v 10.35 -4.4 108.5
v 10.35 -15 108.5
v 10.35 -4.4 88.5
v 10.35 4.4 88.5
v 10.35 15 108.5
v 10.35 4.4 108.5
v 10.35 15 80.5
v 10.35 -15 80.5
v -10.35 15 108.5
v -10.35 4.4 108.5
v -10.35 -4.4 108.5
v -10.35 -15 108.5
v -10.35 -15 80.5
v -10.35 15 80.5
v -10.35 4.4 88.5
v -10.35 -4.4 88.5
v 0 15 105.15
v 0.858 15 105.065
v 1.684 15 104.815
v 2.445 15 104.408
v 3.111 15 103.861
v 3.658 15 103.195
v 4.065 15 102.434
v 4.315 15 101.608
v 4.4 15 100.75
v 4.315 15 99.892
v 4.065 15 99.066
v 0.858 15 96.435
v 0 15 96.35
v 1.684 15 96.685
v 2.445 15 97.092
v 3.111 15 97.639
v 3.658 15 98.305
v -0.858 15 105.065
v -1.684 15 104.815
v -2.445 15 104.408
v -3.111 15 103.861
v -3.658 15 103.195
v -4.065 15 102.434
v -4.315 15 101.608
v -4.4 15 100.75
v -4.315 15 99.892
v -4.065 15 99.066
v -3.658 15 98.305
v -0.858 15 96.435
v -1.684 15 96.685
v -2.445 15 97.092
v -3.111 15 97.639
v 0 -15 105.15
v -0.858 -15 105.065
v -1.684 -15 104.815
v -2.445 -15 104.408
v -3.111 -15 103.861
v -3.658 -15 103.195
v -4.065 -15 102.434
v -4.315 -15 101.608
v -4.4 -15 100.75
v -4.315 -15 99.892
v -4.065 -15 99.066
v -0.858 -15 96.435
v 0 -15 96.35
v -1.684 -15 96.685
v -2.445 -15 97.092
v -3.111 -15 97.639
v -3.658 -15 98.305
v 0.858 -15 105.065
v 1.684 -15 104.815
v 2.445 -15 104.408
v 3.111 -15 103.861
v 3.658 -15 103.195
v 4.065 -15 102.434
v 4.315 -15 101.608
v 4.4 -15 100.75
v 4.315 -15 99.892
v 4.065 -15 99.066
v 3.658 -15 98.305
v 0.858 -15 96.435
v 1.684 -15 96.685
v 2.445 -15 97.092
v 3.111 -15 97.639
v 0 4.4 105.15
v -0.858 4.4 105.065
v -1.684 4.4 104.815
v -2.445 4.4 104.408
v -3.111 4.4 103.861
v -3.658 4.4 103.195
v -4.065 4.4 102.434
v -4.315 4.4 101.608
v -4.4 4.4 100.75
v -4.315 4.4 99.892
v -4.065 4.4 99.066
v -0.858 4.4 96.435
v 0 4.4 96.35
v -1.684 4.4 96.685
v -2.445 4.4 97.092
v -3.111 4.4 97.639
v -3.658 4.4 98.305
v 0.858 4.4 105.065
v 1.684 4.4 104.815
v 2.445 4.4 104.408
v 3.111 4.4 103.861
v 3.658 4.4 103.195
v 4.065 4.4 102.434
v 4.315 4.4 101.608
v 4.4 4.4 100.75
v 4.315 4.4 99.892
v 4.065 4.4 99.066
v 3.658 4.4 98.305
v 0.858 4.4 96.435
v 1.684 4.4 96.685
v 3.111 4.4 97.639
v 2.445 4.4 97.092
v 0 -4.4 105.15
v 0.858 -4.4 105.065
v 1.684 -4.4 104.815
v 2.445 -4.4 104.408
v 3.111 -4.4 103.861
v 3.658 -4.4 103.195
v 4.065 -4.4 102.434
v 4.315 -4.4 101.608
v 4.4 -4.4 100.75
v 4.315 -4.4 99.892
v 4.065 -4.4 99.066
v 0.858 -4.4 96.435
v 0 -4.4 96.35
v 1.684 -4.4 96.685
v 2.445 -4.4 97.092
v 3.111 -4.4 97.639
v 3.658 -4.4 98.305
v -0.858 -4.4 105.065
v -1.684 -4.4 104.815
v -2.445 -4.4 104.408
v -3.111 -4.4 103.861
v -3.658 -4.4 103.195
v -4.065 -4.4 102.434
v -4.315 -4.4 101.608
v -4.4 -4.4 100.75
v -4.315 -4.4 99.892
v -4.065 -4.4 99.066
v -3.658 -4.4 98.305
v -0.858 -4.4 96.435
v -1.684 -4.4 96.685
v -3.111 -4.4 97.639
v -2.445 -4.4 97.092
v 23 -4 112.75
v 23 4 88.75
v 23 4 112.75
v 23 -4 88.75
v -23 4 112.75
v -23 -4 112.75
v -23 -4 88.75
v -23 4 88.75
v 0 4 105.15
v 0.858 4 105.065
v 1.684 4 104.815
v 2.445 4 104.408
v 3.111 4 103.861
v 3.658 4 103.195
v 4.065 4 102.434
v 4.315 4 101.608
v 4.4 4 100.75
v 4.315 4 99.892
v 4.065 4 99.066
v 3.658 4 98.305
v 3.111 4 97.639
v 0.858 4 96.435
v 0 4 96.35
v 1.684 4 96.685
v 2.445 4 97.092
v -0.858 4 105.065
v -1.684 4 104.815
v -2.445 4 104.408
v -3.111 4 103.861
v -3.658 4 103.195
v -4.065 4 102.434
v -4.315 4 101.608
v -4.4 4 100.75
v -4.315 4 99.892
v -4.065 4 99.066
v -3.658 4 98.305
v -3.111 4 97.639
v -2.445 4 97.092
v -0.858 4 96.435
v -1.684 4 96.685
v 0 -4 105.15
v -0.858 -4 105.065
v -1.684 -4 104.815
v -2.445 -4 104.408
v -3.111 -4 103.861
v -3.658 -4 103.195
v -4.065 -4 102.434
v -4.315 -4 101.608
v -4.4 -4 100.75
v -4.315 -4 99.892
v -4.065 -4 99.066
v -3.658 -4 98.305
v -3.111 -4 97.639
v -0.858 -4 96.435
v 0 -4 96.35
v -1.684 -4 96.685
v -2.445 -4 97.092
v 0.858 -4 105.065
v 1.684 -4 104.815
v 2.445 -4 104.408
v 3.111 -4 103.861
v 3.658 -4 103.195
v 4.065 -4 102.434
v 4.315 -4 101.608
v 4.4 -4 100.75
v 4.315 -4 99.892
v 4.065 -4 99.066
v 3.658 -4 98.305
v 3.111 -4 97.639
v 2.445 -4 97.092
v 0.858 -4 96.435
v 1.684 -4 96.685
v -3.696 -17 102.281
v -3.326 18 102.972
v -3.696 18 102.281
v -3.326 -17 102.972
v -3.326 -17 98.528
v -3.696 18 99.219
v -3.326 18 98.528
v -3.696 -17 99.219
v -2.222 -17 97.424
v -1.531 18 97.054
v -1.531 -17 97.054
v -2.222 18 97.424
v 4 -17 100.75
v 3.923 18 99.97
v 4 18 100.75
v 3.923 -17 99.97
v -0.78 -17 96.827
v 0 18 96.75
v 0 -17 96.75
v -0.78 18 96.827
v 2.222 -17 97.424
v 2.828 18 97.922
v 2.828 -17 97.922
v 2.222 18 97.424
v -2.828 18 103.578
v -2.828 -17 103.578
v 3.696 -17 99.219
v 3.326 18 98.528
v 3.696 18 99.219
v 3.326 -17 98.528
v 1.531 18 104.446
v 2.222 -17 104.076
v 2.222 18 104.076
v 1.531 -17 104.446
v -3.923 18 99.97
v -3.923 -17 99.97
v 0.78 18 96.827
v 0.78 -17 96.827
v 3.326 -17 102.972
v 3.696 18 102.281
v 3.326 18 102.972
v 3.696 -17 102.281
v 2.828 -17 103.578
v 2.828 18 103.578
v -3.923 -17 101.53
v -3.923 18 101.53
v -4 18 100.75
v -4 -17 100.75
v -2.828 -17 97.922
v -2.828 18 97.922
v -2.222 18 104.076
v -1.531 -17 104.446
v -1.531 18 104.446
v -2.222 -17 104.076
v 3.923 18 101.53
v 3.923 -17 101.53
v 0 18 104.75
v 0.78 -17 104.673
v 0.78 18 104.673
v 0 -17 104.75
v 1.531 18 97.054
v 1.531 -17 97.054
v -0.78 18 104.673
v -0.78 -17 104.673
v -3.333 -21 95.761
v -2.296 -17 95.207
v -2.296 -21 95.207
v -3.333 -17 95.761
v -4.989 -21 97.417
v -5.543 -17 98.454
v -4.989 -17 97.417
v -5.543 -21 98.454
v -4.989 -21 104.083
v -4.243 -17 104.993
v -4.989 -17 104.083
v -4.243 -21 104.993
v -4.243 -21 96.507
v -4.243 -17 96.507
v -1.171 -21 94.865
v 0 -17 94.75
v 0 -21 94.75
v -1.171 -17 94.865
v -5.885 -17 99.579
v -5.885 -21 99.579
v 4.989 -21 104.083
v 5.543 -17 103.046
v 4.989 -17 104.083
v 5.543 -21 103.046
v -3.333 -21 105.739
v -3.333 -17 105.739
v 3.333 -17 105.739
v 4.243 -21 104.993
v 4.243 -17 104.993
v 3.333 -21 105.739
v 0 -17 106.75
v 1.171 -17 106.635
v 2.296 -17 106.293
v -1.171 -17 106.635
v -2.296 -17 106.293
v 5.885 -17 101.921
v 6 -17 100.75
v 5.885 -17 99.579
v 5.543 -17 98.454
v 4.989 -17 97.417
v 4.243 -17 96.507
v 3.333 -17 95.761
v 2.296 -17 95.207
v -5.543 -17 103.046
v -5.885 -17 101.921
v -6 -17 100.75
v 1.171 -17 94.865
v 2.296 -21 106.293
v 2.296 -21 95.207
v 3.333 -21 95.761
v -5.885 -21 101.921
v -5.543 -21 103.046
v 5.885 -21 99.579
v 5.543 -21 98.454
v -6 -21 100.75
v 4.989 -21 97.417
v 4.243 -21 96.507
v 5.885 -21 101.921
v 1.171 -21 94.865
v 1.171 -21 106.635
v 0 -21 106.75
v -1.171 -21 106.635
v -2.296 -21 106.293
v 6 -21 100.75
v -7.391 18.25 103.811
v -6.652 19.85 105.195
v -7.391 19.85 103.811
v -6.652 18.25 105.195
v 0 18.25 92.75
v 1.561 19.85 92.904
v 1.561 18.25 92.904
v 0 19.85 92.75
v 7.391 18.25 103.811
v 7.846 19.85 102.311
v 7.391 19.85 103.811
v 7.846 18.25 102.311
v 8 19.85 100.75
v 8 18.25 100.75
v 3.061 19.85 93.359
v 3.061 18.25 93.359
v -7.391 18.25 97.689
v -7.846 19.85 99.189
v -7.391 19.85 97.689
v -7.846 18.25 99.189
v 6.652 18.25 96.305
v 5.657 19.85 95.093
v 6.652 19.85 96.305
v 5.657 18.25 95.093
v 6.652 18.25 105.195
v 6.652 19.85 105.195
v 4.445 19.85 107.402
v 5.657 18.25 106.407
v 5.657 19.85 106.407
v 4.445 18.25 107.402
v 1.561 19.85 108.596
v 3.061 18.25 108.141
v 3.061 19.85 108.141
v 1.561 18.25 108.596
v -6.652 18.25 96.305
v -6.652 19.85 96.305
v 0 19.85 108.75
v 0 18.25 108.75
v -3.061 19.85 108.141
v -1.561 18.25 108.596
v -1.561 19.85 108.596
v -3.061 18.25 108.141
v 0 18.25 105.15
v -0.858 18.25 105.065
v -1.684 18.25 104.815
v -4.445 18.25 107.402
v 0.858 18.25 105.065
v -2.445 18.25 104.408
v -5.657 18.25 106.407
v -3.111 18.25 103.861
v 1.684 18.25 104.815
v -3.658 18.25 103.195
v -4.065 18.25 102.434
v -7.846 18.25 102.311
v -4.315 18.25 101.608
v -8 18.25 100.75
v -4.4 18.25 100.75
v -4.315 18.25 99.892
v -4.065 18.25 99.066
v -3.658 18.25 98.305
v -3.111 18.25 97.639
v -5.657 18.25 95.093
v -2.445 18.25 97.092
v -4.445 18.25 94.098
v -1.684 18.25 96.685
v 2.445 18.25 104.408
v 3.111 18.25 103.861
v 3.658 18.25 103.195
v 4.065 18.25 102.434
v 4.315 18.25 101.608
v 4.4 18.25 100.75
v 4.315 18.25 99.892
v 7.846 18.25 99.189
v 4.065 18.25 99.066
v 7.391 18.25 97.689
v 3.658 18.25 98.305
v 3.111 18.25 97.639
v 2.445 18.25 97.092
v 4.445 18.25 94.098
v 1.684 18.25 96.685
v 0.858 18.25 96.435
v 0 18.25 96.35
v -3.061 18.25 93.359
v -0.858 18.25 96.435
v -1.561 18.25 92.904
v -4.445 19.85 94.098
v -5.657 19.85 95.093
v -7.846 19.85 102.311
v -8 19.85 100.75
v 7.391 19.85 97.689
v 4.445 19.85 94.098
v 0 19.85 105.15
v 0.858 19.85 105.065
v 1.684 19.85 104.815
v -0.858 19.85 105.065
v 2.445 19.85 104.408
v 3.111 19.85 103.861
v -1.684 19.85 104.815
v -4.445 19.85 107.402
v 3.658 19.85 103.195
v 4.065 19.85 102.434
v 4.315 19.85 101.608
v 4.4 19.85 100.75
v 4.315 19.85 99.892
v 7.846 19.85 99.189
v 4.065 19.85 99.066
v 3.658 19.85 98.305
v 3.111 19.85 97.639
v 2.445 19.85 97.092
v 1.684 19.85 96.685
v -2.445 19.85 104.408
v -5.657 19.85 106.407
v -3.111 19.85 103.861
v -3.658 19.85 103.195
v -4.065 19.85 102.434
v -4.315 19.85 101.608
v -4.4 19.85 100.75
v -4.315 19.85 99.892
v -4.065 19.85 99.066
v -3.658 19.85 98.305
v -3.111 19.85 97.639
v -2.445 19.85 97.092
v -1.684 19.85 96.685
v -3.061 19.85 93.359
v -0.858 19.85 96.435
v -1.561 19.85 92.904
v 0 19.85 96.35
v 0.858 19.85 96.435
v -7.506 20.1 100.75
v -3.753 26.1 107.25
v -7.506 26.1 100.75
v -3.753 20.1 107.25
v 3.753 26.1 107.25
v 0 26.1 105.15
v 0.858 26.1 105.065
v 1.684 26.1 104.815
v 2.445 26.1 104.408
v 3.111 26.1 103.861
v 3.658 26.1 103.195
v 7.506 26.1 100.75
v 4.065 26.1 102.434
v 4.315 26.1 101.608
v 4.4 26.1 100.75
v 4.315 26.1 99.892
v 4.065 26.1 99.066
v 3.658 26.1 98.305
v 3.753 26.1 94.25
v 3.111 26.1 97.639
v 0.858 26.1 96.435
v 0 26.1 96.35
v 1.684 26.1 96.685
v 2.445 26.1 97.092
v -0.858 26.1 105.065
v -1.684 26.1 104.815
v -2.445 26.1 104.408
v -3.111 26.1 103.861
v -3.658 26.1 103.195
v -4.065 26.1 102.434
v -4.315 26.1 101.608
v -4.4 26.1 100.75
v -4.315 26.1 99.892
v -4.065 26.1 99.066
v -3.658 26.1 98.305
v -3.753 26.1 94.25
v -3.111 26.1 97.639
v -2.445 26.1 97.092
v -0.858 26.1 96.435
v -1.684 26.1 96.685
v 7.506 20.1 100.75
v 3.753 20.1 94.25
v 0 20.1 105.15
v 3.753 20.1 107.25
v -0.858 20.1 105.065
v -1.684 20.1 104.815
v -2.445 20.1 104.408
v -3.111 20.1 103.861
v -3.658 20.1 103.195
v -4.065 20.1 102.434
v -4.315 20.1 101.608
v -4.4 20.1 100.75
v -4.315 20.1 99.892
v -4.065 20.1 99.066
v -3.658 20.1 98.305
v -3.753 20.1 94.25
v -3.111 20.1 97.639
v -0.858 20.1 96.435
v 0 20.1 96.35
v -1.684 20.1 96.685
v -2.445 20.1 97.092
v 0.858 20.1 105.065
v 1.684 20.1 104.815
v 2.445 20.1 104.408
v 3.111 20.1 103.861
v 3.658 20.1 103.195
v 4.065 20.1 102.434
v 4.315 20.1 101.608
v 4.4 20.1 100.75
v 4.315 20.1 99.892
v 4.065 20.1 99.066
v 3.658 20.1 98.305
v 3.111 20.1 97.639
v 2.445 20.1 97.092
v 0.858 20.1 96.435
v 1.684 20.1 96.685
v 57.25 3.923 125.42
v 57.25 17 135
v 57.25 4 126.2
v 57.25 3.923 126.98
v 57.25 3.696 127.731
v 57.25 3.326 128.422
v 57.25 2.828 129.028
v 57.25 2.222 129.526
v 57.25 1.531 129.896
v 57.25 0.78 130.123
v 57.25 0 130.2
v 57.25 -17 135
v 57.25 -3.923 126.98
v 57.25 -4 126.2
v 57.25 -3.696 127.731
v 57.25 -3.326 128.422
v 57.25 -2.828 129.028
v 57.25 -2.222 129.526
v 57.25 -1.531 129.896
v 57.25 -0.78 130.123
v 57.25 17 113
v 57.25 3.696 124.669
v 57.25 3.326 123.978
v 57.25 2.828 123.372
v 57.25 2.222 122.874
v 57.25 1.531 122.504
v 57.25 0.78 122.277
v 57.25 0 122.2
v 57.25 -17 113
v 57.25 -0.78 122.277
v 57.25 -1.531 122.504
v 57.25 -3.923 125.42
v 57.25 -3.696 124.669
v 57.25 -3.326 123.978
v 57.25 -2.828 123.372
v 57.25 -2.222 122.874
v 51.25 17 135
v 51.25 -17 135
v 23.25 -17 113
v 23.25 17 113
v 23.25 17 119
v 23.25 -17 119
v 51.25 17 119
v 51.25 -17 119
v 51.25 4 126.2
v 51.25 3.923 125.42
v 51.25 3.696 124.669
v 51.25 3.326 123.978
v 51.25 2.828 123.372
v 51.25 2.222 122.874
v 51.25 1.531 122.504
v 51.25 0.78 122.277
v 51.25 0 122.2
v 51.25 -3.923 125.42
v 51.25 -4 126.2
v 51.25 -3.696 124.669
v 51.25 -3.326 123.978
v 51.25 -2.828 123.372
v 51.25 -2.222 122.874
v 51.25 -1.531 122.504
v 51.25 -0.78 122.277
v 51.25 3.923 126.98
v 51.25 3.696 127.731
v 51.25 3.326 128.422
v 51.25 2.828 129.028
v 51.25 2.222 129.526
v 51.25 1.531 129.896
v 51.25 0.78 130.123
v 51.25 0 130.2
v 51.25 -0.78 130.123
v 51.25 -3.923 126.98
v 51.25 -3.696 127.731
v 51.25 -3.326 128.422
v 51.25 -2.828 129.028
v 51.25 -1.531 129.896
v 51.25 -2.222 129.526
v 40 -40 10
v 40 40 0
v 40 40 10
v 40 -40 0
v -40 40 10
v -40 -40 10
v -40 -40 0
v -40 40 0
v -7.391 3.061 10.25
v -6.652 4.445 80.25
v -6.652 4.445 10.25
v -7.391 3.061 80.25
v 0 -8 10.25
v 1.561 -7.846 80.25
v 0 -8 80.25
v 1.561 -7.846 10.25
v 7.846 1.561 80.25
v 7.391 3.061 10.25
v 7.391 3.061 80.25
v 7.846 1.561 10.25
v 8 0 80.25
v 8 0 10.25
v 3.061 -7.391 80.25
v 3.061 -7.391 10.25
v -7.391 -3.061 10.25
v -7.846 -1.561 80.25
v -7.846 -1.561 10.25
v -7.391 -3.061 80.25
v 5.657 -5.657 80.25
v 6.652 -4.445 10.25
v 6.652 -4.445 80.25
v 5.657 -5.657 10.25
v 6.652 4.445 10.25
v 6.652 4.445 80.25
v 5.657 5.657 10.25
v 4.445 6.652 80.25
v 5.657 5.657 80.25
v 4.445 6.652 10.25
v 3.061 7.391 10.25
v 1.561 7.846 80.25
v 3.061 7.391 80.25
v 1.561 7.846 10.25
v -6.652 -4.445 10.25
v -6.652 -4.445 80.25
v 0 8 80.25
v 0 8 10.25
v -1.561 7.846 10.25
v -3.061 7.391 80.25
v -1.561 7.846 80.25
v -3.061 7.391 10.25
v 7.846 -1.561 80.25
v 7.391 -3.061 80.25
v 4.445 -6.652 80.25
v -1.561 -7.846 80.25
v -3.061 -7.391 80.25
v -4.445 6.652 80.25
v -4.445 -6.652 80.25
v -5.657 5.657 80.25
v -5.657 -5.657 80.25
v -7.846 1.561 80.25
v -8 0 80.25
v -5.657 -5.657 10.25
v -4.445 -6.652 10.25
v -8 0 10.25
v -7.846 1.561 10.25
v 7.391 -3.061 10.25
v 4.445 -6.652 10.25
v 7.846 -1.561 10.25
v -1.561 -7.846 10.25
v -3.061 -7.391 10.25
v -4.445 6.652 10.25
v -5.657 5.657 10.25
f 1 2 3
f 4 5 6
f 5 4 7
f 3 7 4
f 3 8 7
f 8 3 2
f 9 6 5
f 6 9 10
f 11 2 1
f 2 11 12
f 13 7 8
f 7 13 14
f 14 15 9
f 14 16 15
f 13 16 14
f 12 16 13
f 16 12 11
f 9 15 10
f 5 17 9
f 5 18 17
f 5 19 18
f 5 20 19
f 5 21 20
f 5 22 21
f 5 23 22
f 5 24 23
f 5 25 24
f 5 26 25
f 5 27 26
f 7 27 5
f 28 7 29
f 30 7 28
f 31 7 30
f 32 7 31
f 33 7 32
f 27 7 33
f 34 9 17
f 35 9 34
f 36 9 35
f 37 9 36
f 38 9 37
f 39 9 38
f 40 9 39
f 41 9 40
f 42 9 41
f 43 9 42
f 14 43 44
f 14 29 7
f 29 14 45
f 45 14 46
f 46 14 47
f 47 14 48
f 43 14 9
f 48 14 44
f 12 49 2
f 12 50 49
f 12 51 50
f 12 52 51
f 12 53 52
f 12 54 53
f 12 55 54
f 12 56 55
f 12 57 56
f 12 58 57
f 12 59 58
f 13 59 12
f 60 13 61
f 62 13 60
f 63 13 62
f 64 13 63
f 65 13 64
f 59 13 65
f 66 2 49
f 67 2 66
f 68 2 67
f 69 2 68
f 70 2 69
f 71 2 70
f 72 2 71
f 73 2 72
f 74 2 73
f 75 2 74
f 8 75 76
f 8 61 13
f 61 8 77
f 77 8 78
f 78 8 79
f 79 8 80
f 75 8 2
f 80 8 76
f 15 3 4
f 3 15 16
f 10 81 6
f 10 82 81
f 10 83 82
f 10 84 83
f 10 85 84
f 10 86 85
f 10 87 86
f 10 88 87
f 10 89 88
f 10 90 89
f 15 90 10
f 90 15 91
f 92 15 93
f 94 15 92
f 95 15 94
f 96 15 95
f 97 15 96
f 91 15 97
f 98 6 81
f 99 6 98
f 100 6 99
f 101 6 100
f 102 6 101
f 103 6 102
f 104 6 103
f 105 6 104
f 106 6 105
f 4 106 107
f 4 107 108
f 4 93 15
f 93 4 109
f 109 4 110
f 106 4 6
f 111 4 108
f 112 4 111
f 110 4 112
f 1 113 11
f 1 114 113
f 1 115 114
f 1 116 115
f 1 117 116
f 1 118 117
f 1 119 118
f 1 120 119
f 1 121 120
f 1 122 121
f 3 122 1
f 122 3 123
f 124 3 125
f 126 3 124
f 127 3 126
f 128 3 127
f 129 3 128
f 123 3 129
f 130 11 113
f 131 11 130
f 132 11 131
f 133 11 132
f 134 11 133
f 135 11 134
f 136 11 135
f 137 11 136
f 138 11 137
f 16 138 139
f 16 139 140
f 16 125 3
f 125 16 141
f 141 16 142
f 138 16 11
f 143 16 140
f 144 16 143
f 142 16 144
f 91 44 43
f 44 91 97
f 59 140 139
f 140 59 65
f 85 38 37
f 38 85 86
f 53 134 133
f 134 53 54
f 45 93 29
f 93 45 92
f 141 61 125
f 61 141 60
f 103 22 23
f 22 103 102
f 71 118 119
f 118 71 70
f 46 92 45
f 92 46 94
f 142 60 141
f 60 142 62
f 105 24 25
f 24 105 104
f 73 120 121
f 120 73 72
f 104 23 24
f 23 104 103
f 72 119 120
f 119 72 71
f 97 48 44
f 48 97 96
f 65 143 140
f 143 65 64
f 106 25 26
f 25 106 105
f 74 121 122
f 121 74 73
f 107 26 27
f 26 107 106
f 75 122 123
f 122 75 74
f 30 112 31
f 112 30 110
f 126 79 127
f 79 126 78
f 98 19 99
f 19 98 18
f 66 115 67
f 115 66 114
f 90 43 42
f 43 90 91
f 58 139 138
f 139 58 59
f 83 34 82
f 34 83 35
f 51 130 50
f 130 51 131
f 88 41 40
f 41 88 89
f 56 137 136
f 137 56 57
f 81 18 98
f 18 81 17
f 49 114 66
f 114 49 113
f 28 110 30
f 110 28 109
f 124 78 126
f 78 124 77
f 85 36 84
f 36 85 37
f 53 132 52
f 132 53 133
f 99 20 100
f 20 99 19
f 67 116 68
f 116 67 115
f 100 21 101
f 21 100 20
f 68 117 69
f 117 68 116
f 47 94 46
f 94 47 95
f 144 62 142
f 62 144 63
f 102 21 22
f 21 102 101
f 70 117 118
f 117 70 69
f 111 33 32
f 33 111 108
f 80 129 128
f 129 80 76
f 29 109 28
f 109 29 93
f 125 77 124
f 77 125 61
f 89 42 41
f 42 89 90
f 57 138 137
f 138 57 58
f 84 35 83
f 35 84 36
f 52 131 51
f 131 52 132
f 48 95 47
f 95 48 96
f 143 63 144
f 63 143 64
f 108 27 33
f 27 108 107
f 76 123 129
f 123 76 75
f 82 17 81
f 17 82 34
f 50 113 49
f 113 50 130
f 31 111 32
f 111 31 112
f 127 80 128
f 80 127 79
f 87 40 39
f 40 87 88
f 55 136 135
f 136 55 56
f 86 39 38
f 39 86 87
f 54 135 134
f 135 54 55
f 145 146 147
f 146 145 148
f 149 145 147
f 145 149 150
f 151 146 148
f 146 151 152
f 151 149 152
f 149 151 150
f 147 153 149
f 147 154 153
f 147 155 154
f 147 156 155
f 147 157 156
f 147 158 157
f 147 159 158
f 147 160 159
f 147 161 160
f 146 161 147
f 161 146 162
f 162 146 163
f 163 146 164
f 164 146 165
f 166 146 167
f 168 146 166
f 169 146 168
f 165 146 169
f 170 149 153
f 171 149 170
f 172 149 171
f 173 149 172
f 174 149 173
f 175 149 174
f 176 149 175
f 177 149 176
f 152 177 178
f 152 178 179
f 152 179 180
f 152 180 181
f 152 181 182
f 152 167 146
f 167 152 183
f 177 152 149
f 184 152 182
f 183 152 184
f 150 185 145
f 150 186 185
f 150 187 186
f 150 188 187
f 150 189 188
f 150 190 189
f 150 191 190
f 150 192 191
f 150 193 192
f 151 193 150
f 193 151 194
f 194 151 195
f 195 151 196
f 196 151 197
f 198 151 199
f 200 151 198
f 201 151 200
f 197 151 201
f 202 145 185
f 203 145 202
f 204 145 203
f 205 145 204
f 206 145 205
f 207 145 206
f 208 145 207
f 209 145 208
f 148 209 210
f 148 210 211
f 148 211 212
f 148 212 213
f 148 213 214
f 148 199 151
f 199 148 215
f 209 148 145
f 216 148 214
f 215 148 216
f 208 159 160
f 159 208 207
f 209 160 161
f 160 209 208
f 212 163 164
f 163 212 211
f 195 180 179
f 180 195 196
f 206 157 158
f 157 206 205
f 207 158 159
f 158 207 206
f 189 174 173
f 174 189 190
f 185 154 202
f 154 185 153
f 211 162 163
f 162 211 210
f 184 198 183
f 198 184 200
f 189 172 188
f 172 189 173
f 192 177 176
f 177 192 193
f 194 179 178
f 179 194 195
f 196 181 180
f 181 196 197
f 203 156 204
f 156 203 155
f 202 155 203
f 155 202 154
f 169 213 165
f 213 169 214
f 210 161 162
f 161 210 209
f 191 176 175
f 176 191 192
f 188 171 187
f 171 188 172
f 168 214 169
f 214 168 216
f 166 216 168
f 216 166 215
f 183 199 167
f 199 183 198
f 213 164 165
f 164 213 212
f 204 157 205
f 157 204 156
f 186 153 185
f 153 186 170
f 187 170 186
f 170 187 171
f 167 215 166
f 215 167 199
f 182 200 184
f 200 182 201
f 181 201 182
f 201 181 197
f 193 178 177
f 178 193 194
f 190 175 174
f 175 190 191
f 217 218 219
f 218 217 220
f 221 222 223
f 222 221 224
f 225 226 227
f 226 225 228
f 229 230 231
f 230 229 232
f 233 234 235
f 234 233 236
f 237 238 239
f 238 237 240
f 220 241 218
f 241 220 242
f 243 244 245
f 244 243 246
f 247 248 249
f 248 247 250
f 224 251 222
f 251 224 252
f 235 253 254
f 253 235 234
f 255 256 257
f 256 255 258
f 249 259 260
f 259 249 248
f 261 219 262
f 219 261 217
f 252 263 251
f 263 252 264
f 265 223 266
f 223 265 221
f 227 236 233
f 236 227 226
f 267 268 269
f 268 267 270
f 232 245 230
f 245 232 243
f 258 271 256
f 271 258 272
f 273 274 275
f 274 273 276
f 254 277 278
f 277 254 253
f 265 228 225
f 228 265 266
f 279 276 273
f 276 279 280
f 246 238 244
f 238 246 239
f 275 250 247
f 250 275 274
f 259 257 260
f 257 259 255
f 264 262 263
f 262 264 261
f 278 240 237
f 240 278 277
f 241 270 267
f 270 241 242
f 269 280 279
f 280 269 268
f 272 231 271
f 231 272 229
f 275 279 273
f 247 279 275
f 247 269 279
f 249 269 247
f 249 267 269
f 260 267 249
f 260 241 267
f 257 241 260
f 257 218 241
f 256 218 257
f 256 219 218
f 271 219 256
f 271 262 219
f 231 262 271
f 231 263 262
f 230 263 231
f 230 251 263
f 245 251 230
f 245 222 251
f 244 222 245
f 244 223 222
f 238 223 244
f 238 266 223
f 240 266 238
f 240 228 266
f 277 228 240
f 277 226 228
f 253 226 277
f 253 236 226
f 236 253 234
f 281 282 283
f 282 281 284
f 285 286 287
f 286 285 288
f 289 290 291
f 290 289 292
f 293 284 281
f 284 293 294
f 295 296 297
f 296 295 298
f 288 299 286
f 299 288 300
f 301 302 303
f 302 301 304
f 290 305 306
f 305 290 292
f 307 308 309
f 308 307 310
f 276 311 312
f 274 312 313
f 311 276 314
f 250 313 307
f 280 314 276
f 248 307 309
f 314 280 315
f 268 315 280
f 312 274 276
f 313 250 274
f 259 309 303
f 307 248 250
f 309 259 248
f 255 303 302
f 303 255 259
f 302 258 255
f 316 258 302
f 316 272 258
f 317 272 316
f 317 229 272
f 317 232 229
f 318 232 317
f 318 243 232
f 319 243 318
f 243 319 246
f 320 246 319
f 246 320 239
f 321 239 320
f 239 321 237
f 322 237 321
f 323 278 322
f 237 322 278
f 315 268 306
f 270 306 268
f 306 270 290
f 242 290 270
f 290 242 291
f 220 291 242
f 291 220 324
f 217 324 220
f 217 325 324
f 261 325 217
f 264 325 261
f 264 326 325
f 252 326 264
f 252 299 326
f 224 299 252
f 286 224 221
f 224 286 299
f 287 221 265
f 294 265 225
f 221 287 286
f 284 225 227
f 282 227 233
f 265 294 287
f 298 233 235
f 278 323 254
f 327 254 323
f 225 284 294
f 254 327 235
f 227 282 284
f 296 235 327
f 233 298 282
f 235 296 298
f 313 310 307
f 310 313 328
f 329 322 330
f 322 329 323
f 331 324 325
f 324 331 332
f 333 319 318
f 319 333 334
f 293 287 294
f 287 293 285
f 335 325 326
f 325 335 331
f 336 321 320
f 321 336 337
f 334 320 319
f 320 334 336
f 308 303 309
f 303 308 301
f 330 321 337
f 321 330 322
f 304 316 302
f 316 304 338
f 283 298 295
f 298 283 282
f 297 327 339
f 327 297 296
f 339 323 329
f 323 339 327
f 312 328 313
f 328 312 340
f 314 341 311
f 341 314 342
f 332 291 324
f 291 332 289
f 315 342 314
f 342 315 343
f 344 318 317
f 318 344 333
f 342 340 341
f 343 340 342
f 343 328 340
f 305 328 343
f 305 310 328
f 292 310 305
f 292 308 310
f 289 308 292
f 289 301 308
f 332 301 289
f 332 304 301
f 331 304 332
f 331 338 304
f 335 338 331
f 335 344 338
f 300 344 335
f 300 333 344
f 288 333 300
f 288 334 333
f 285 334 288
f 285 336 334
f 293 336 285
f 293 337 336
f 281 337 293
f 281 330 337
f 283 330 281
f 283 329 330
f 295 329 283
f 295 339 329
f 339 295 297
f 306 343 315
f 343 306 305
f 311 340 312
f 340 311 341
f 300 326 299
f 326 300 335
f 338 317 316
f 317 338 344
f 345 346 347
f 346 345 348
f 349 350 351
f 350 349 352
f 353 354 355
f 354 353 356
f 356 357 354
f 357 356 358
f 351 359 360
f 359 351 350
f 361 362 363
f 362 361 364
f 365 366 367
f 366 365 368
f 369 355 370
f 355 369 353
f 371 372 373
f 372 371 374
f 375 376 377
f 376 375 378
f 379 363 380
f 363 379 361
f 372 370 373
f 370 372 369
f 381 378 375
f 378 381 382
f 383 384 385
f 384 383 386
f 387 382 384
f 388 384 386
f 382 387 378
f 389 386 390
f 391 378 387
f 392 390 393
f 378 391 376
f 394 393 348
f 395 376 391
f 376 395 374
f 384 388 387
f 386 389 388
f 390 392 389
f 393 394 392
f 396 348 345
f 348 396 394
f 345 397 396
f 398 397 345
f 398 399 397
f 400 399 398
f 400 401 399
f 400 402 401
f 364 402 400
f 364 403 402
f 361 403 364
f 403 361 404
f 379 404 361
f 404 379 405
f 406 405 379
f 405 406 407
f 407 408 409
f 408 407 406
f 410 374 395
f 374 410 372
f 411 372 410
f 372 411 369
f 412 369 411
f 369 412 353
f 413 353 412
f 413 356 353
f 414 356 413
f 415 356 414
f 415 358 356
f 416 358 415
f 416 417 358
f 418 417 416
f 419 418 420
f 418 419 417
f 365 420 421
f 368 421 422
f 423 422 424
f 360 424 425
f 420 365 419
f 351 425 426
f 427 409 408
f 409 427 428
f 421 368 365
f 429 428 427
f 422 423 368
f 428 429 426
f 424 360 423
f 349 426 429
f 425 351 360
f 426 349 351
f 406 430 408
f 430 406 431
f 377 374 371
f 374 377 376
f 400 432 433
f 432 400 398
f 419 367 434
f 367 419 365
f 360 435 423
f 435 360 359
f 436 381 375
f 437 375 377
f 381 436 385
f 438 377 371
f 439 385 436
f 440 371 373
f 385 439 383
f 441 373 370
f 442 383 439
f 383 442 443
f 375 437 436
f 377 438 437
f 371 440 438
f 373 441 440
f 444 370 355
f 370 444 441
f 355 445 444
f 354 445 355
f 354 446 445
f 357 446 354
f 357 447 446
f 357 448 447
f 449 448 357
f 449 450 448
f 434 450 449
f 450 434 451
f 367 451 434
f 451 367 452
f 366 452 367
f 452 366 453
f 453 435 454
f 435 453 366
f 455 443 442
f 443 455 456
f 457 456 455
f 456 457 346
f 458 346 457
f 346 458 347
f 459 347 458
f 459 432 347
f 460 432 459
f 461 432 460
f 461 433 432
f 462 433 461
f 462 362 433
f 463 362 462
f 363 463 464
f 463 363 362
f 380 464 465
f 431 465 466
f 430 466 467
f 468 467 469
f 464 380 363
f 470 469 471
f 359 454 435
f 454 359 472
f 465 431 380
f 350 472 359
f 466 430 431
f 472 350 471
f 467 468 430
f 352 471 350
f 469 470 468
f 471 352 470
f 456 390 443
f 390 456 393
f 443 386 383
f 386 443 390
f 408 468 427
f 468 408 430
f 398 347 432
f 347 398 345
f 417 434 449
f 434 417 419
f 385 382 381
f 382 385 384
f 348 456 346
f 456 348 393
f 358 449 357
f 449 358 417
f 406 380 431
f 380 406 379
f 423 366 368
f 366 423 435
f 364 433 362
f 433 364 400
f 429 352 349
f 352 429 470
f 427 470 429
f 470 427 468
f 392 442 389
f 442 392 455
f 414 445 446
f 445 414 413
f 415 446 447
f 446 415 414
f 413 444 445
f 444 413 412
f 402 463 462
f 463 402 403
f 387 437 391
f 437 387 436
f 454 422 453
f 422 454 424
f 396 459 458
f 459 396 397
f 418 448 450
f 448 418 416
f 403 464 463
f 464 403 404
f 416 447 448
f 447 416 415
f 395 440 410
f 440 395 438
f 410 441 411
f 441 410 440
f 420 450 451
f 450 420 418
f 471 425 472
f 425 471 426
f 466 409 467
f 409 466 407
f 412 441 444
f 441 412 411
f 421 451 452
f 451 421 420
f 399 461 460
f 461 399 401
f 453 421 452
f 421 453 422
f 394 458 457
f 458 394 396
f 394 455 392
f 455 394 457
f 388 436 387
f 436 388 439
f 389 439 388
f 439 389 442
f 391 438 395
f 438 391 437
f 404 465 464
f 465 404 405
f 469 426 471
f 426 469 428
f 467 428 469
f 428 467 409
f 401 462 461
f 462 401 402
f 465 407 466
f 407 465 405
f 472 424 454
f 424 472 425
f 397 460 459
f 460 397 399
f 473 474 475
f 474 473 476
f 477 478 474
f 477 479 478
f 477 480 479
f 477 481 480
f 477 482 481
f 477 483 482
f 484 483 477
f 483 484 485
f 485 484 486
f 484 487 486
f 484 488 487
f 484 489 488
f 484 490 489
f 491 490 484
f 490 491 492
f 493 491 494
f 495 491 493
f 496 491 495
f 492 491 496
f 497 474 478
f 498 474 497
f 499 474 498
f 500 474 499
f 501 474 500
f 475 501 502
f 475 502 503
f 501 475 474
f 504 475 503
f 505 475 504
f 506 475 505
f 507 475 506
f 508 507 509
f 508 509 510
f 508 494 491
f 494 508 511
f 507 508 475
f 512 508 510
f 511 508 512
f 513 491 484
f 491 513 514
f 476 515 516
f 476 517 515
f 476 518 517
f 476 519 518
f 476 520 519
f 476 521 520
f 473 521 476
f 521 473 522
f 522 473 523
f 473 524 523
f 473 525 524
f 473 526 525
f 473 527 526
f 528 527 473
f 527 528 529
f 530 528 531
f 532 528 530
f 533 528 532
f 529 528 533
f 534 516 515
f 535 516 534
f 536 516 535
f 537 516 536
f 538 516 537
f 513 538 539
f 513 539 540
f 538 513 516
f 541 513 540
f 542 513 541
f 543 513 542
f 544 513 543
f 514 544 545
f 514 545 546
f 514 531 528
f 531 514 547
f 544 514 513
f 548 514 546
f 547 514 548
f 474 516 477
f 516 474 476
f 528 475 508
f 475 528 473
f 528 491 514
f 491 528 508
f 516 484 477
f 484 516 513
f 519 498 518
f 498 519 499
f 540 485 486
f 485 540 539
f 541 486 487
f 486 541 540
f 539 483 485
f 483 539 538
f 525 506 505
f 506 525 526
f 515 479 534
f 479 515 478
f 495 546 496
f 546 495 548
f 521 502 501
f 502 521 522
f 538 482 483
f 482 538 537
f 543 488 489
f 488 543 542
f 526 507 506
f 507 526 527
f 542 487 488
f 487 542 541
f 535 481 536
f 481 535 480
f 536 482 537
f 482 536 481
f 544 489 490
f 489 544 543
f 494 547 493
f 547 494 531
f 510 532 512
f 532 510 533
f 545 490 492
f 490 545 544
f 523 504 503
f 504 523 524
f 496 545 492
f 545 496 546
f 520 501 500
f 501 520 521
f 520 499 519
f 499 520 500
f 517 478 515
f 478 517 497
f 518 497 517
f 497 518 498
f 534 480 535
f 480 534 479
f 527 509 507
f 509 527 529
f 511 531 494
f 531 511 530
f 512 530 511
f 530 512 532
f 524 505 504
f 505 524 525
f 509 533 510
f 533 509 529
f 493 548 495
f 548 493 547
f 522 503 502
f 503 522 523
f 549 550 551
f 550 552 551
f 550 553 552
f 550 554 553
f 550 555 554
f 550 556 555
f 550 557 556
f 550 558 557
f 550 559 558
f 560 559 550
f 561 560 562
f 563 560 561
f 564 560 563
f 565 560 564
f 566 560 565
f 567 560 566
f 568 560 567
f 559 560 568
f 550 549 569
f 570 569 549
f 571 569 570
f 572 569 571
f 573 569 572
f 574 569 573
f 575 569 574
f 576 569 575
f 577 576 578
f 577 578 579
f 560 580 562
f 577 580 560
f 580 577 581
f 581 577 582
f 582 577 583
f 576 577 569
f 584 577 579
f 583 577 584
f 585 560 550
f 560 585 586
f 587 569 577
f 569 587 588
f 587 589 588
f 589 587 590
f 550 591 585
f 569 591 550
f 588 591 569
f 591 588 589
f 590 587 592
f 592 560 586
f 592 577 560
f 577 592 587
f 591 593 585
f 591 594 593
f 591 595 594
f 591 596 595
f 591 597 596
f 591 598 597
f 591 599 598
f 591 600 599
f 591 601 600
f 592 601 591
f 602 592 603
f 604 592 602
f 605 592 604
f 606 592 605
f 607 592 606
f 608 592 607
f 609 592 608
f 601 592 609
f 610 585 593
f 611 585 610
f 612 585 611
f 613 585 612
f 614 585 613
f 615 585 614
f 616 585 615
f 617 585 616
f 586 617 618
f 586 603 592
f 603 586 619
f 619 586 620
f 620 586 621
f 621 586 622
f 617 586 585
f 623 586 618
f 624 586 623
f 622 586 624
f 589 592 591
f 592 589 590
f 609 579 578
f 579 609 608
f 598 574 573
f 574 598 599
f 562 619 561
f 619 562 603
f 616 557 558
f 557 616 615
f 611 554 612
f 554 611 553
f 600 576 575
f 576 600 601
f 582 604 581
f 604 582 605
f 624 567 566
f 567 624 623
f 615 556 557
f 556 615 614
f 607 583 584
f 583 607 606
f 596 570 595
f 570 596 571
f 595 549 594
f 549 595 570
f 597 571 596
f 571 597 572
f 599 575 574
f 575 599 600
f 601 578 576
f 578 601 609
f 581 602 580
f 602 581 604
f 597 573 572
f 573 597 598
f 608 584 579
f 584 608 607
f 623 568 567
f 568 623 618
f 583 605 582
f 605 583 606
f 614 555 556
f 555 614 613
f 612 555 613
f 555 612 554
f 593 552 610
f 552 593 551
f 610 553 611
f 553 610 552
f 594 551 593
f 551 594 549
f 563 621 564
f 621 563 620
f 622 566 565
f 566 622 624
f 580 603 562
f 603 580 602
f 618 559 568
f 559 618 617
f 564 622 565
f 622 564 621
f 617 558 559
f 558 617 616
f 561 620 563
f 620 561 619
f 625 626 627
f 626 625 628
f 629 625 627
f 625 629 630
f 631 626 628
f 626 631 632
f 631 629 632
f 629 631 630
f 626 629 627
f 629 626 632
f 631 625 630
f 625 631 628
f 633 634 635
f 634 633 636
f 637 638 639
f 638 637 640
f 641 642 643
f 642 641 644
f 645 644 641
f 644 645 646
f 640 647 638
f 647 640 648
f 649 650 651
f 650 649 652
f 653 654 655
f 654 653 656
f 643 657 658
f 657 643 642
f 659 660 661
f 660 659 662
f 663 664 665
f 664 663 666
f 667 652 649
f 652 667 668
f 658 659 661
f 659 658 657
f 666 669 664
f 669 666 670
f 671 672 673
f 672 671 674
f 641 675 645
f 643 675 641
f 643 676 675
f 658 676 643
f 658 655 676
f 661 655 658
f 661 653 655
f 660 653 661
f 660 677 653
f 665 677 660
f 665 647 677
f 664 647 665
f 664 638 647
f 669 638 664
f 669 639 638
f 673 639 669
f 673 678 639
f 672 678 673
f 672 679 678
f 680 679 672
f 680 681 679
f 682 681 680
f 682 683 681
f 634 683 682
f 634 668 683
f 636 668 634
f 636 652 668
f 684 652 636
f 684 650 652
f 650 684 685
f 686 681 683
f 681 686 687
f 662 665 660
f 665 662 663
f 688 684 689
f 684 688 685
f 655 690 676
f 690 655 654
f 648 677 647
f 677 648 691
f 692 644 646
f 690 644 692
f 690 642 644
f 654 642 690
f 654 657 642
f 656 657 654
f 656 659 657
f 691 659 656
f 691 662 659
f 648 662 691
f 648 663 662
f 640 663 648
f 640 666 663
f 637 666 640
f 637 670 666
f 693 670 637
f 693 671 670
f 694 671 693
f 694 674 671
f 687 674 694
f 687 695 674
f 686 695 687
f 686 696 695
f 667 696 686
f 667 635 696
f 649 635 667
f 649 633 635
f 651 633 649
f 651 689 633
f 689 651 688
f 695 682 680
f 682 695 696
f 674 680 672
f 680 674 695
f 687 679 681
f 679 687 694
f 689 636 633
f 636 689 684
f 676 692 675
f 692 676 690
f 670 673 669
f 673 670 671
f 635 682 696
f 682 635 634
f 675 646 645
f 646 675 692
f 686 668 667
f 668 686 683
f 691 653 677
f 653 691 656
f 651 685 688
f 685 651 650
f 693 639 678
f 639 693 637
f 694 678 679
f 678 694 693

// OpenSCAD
$fn = 32;

// ------------------------------------------------------------------------
// Lamp arm: column d16 x 70 mm, arm 46 mm
// Every part is its own module, assembly() places every instance.
// ------------------------------------------------------------------------

// --- part 1 ---
module lamp_base() {
  difference() {
    translate([-40, -40, 0]) cube([80, 80, 10]);
  }
}

// --- part 2 ---
module lamp_column() {
  cylinder(h = 70, d = 16);
}

// --- part 3 ---
module head_fork() {
  difference() {
    translate([-10.35, -15, 0]) cube([20.7, 30, 28]);
    translate([-11.35, -4.4, 8]) cube([22.7, 8.8, 21]);
    translate([0, 0, 20.25]) rotate([90, 0, 0]) cylinder(h = 32, d = 8.8, center = true);
  }
}

// --- part 4 ---
module lamp_arm() {
  difference() {
    translate([-23, -4, 0]) cube([46, 8, 24]);
    translate([0, 0, 12]) rotate([90, 0, 0]) cylinder(h = 10, d = 8.8, center = true);
  }
}

// --- part 5 ---
module arm_pin() {
  rotate([0, 90, 0]) cylinder(h = 36, d = 8, center = true);
  translate([-21, 0, 0]) rotate([0, 90, 0]) cylinder(h = 4, d = 12);
}

// --- part 6 ---
module arm_washer() {
  difference() {
      translate([0, 0, 0]) cylinder(h = 1.6, d = 16);
      translate([0, 0, -1]) cylinder(h = 3.6, d = 8.8);
    }
}

// --- part 7 ---
module arm_nut() {
  difference() {
    linear_extrude(height = 6) polygon(points = [[7.506, 0], [3.753, 6.5], [-3.753, 6.5], [-7.506, 0], [-3.753, -6.5], [3.753, -6.5]]);
    translate([0, 0, -1]) cylinder(h = 8, d = 8.8);
  }
}

// --- part 8 ---
module shade_bracket() {
  difference() {
    translate([-17, -17, 0]) cube([34, 34, 22]);
    translate([-18, -18, 6]) cube([29, 36, 17]);
    translate([14, 0, 13.2]) rotate([0, 90, 0]) cylinder(h = 8, d = 8, center = true);
  }
}

// --- assembly ---
module assembly() {
  color([0.80, 0.24, 0.20]) translate([0, 0, 0]) rotate([0, 0, 0]) lamp_base();
  color([0.20, 0.45, 0.75]) translate([0, 0, 10.25]) rotate([0, 0, 0]) lamp_column();
  color([0.25, 0.62, 0.32]) translate([0, 0, 80.5]) rotate([0, 0, 0]) head_fork();
  color([0.92, 0.70, 0.18]) translate([0, 0, 88.75]) rotate([0, 0, 0]) lamp_arm();
  color([0.58, 0.35, 0.70]) translate([0, 0, 100.75]) rotate([0, 0, 90]) arm_pin();
  color([0.16, 0.66, 0.66]) translate([0, 19.85, 100.75]) rotate([90, 0, 0]) arm_washer();
  color([0.85, 0.48, 0.18]) translate([0, 26.1, 100.75]) rotate([90, 0, 0]) arm_nut();
  color([0.55, 0.60, 0.65]) translate([40.25, 0, 113]) rotate([0, 0, 0]) shade_bracket();
}

assembly();
